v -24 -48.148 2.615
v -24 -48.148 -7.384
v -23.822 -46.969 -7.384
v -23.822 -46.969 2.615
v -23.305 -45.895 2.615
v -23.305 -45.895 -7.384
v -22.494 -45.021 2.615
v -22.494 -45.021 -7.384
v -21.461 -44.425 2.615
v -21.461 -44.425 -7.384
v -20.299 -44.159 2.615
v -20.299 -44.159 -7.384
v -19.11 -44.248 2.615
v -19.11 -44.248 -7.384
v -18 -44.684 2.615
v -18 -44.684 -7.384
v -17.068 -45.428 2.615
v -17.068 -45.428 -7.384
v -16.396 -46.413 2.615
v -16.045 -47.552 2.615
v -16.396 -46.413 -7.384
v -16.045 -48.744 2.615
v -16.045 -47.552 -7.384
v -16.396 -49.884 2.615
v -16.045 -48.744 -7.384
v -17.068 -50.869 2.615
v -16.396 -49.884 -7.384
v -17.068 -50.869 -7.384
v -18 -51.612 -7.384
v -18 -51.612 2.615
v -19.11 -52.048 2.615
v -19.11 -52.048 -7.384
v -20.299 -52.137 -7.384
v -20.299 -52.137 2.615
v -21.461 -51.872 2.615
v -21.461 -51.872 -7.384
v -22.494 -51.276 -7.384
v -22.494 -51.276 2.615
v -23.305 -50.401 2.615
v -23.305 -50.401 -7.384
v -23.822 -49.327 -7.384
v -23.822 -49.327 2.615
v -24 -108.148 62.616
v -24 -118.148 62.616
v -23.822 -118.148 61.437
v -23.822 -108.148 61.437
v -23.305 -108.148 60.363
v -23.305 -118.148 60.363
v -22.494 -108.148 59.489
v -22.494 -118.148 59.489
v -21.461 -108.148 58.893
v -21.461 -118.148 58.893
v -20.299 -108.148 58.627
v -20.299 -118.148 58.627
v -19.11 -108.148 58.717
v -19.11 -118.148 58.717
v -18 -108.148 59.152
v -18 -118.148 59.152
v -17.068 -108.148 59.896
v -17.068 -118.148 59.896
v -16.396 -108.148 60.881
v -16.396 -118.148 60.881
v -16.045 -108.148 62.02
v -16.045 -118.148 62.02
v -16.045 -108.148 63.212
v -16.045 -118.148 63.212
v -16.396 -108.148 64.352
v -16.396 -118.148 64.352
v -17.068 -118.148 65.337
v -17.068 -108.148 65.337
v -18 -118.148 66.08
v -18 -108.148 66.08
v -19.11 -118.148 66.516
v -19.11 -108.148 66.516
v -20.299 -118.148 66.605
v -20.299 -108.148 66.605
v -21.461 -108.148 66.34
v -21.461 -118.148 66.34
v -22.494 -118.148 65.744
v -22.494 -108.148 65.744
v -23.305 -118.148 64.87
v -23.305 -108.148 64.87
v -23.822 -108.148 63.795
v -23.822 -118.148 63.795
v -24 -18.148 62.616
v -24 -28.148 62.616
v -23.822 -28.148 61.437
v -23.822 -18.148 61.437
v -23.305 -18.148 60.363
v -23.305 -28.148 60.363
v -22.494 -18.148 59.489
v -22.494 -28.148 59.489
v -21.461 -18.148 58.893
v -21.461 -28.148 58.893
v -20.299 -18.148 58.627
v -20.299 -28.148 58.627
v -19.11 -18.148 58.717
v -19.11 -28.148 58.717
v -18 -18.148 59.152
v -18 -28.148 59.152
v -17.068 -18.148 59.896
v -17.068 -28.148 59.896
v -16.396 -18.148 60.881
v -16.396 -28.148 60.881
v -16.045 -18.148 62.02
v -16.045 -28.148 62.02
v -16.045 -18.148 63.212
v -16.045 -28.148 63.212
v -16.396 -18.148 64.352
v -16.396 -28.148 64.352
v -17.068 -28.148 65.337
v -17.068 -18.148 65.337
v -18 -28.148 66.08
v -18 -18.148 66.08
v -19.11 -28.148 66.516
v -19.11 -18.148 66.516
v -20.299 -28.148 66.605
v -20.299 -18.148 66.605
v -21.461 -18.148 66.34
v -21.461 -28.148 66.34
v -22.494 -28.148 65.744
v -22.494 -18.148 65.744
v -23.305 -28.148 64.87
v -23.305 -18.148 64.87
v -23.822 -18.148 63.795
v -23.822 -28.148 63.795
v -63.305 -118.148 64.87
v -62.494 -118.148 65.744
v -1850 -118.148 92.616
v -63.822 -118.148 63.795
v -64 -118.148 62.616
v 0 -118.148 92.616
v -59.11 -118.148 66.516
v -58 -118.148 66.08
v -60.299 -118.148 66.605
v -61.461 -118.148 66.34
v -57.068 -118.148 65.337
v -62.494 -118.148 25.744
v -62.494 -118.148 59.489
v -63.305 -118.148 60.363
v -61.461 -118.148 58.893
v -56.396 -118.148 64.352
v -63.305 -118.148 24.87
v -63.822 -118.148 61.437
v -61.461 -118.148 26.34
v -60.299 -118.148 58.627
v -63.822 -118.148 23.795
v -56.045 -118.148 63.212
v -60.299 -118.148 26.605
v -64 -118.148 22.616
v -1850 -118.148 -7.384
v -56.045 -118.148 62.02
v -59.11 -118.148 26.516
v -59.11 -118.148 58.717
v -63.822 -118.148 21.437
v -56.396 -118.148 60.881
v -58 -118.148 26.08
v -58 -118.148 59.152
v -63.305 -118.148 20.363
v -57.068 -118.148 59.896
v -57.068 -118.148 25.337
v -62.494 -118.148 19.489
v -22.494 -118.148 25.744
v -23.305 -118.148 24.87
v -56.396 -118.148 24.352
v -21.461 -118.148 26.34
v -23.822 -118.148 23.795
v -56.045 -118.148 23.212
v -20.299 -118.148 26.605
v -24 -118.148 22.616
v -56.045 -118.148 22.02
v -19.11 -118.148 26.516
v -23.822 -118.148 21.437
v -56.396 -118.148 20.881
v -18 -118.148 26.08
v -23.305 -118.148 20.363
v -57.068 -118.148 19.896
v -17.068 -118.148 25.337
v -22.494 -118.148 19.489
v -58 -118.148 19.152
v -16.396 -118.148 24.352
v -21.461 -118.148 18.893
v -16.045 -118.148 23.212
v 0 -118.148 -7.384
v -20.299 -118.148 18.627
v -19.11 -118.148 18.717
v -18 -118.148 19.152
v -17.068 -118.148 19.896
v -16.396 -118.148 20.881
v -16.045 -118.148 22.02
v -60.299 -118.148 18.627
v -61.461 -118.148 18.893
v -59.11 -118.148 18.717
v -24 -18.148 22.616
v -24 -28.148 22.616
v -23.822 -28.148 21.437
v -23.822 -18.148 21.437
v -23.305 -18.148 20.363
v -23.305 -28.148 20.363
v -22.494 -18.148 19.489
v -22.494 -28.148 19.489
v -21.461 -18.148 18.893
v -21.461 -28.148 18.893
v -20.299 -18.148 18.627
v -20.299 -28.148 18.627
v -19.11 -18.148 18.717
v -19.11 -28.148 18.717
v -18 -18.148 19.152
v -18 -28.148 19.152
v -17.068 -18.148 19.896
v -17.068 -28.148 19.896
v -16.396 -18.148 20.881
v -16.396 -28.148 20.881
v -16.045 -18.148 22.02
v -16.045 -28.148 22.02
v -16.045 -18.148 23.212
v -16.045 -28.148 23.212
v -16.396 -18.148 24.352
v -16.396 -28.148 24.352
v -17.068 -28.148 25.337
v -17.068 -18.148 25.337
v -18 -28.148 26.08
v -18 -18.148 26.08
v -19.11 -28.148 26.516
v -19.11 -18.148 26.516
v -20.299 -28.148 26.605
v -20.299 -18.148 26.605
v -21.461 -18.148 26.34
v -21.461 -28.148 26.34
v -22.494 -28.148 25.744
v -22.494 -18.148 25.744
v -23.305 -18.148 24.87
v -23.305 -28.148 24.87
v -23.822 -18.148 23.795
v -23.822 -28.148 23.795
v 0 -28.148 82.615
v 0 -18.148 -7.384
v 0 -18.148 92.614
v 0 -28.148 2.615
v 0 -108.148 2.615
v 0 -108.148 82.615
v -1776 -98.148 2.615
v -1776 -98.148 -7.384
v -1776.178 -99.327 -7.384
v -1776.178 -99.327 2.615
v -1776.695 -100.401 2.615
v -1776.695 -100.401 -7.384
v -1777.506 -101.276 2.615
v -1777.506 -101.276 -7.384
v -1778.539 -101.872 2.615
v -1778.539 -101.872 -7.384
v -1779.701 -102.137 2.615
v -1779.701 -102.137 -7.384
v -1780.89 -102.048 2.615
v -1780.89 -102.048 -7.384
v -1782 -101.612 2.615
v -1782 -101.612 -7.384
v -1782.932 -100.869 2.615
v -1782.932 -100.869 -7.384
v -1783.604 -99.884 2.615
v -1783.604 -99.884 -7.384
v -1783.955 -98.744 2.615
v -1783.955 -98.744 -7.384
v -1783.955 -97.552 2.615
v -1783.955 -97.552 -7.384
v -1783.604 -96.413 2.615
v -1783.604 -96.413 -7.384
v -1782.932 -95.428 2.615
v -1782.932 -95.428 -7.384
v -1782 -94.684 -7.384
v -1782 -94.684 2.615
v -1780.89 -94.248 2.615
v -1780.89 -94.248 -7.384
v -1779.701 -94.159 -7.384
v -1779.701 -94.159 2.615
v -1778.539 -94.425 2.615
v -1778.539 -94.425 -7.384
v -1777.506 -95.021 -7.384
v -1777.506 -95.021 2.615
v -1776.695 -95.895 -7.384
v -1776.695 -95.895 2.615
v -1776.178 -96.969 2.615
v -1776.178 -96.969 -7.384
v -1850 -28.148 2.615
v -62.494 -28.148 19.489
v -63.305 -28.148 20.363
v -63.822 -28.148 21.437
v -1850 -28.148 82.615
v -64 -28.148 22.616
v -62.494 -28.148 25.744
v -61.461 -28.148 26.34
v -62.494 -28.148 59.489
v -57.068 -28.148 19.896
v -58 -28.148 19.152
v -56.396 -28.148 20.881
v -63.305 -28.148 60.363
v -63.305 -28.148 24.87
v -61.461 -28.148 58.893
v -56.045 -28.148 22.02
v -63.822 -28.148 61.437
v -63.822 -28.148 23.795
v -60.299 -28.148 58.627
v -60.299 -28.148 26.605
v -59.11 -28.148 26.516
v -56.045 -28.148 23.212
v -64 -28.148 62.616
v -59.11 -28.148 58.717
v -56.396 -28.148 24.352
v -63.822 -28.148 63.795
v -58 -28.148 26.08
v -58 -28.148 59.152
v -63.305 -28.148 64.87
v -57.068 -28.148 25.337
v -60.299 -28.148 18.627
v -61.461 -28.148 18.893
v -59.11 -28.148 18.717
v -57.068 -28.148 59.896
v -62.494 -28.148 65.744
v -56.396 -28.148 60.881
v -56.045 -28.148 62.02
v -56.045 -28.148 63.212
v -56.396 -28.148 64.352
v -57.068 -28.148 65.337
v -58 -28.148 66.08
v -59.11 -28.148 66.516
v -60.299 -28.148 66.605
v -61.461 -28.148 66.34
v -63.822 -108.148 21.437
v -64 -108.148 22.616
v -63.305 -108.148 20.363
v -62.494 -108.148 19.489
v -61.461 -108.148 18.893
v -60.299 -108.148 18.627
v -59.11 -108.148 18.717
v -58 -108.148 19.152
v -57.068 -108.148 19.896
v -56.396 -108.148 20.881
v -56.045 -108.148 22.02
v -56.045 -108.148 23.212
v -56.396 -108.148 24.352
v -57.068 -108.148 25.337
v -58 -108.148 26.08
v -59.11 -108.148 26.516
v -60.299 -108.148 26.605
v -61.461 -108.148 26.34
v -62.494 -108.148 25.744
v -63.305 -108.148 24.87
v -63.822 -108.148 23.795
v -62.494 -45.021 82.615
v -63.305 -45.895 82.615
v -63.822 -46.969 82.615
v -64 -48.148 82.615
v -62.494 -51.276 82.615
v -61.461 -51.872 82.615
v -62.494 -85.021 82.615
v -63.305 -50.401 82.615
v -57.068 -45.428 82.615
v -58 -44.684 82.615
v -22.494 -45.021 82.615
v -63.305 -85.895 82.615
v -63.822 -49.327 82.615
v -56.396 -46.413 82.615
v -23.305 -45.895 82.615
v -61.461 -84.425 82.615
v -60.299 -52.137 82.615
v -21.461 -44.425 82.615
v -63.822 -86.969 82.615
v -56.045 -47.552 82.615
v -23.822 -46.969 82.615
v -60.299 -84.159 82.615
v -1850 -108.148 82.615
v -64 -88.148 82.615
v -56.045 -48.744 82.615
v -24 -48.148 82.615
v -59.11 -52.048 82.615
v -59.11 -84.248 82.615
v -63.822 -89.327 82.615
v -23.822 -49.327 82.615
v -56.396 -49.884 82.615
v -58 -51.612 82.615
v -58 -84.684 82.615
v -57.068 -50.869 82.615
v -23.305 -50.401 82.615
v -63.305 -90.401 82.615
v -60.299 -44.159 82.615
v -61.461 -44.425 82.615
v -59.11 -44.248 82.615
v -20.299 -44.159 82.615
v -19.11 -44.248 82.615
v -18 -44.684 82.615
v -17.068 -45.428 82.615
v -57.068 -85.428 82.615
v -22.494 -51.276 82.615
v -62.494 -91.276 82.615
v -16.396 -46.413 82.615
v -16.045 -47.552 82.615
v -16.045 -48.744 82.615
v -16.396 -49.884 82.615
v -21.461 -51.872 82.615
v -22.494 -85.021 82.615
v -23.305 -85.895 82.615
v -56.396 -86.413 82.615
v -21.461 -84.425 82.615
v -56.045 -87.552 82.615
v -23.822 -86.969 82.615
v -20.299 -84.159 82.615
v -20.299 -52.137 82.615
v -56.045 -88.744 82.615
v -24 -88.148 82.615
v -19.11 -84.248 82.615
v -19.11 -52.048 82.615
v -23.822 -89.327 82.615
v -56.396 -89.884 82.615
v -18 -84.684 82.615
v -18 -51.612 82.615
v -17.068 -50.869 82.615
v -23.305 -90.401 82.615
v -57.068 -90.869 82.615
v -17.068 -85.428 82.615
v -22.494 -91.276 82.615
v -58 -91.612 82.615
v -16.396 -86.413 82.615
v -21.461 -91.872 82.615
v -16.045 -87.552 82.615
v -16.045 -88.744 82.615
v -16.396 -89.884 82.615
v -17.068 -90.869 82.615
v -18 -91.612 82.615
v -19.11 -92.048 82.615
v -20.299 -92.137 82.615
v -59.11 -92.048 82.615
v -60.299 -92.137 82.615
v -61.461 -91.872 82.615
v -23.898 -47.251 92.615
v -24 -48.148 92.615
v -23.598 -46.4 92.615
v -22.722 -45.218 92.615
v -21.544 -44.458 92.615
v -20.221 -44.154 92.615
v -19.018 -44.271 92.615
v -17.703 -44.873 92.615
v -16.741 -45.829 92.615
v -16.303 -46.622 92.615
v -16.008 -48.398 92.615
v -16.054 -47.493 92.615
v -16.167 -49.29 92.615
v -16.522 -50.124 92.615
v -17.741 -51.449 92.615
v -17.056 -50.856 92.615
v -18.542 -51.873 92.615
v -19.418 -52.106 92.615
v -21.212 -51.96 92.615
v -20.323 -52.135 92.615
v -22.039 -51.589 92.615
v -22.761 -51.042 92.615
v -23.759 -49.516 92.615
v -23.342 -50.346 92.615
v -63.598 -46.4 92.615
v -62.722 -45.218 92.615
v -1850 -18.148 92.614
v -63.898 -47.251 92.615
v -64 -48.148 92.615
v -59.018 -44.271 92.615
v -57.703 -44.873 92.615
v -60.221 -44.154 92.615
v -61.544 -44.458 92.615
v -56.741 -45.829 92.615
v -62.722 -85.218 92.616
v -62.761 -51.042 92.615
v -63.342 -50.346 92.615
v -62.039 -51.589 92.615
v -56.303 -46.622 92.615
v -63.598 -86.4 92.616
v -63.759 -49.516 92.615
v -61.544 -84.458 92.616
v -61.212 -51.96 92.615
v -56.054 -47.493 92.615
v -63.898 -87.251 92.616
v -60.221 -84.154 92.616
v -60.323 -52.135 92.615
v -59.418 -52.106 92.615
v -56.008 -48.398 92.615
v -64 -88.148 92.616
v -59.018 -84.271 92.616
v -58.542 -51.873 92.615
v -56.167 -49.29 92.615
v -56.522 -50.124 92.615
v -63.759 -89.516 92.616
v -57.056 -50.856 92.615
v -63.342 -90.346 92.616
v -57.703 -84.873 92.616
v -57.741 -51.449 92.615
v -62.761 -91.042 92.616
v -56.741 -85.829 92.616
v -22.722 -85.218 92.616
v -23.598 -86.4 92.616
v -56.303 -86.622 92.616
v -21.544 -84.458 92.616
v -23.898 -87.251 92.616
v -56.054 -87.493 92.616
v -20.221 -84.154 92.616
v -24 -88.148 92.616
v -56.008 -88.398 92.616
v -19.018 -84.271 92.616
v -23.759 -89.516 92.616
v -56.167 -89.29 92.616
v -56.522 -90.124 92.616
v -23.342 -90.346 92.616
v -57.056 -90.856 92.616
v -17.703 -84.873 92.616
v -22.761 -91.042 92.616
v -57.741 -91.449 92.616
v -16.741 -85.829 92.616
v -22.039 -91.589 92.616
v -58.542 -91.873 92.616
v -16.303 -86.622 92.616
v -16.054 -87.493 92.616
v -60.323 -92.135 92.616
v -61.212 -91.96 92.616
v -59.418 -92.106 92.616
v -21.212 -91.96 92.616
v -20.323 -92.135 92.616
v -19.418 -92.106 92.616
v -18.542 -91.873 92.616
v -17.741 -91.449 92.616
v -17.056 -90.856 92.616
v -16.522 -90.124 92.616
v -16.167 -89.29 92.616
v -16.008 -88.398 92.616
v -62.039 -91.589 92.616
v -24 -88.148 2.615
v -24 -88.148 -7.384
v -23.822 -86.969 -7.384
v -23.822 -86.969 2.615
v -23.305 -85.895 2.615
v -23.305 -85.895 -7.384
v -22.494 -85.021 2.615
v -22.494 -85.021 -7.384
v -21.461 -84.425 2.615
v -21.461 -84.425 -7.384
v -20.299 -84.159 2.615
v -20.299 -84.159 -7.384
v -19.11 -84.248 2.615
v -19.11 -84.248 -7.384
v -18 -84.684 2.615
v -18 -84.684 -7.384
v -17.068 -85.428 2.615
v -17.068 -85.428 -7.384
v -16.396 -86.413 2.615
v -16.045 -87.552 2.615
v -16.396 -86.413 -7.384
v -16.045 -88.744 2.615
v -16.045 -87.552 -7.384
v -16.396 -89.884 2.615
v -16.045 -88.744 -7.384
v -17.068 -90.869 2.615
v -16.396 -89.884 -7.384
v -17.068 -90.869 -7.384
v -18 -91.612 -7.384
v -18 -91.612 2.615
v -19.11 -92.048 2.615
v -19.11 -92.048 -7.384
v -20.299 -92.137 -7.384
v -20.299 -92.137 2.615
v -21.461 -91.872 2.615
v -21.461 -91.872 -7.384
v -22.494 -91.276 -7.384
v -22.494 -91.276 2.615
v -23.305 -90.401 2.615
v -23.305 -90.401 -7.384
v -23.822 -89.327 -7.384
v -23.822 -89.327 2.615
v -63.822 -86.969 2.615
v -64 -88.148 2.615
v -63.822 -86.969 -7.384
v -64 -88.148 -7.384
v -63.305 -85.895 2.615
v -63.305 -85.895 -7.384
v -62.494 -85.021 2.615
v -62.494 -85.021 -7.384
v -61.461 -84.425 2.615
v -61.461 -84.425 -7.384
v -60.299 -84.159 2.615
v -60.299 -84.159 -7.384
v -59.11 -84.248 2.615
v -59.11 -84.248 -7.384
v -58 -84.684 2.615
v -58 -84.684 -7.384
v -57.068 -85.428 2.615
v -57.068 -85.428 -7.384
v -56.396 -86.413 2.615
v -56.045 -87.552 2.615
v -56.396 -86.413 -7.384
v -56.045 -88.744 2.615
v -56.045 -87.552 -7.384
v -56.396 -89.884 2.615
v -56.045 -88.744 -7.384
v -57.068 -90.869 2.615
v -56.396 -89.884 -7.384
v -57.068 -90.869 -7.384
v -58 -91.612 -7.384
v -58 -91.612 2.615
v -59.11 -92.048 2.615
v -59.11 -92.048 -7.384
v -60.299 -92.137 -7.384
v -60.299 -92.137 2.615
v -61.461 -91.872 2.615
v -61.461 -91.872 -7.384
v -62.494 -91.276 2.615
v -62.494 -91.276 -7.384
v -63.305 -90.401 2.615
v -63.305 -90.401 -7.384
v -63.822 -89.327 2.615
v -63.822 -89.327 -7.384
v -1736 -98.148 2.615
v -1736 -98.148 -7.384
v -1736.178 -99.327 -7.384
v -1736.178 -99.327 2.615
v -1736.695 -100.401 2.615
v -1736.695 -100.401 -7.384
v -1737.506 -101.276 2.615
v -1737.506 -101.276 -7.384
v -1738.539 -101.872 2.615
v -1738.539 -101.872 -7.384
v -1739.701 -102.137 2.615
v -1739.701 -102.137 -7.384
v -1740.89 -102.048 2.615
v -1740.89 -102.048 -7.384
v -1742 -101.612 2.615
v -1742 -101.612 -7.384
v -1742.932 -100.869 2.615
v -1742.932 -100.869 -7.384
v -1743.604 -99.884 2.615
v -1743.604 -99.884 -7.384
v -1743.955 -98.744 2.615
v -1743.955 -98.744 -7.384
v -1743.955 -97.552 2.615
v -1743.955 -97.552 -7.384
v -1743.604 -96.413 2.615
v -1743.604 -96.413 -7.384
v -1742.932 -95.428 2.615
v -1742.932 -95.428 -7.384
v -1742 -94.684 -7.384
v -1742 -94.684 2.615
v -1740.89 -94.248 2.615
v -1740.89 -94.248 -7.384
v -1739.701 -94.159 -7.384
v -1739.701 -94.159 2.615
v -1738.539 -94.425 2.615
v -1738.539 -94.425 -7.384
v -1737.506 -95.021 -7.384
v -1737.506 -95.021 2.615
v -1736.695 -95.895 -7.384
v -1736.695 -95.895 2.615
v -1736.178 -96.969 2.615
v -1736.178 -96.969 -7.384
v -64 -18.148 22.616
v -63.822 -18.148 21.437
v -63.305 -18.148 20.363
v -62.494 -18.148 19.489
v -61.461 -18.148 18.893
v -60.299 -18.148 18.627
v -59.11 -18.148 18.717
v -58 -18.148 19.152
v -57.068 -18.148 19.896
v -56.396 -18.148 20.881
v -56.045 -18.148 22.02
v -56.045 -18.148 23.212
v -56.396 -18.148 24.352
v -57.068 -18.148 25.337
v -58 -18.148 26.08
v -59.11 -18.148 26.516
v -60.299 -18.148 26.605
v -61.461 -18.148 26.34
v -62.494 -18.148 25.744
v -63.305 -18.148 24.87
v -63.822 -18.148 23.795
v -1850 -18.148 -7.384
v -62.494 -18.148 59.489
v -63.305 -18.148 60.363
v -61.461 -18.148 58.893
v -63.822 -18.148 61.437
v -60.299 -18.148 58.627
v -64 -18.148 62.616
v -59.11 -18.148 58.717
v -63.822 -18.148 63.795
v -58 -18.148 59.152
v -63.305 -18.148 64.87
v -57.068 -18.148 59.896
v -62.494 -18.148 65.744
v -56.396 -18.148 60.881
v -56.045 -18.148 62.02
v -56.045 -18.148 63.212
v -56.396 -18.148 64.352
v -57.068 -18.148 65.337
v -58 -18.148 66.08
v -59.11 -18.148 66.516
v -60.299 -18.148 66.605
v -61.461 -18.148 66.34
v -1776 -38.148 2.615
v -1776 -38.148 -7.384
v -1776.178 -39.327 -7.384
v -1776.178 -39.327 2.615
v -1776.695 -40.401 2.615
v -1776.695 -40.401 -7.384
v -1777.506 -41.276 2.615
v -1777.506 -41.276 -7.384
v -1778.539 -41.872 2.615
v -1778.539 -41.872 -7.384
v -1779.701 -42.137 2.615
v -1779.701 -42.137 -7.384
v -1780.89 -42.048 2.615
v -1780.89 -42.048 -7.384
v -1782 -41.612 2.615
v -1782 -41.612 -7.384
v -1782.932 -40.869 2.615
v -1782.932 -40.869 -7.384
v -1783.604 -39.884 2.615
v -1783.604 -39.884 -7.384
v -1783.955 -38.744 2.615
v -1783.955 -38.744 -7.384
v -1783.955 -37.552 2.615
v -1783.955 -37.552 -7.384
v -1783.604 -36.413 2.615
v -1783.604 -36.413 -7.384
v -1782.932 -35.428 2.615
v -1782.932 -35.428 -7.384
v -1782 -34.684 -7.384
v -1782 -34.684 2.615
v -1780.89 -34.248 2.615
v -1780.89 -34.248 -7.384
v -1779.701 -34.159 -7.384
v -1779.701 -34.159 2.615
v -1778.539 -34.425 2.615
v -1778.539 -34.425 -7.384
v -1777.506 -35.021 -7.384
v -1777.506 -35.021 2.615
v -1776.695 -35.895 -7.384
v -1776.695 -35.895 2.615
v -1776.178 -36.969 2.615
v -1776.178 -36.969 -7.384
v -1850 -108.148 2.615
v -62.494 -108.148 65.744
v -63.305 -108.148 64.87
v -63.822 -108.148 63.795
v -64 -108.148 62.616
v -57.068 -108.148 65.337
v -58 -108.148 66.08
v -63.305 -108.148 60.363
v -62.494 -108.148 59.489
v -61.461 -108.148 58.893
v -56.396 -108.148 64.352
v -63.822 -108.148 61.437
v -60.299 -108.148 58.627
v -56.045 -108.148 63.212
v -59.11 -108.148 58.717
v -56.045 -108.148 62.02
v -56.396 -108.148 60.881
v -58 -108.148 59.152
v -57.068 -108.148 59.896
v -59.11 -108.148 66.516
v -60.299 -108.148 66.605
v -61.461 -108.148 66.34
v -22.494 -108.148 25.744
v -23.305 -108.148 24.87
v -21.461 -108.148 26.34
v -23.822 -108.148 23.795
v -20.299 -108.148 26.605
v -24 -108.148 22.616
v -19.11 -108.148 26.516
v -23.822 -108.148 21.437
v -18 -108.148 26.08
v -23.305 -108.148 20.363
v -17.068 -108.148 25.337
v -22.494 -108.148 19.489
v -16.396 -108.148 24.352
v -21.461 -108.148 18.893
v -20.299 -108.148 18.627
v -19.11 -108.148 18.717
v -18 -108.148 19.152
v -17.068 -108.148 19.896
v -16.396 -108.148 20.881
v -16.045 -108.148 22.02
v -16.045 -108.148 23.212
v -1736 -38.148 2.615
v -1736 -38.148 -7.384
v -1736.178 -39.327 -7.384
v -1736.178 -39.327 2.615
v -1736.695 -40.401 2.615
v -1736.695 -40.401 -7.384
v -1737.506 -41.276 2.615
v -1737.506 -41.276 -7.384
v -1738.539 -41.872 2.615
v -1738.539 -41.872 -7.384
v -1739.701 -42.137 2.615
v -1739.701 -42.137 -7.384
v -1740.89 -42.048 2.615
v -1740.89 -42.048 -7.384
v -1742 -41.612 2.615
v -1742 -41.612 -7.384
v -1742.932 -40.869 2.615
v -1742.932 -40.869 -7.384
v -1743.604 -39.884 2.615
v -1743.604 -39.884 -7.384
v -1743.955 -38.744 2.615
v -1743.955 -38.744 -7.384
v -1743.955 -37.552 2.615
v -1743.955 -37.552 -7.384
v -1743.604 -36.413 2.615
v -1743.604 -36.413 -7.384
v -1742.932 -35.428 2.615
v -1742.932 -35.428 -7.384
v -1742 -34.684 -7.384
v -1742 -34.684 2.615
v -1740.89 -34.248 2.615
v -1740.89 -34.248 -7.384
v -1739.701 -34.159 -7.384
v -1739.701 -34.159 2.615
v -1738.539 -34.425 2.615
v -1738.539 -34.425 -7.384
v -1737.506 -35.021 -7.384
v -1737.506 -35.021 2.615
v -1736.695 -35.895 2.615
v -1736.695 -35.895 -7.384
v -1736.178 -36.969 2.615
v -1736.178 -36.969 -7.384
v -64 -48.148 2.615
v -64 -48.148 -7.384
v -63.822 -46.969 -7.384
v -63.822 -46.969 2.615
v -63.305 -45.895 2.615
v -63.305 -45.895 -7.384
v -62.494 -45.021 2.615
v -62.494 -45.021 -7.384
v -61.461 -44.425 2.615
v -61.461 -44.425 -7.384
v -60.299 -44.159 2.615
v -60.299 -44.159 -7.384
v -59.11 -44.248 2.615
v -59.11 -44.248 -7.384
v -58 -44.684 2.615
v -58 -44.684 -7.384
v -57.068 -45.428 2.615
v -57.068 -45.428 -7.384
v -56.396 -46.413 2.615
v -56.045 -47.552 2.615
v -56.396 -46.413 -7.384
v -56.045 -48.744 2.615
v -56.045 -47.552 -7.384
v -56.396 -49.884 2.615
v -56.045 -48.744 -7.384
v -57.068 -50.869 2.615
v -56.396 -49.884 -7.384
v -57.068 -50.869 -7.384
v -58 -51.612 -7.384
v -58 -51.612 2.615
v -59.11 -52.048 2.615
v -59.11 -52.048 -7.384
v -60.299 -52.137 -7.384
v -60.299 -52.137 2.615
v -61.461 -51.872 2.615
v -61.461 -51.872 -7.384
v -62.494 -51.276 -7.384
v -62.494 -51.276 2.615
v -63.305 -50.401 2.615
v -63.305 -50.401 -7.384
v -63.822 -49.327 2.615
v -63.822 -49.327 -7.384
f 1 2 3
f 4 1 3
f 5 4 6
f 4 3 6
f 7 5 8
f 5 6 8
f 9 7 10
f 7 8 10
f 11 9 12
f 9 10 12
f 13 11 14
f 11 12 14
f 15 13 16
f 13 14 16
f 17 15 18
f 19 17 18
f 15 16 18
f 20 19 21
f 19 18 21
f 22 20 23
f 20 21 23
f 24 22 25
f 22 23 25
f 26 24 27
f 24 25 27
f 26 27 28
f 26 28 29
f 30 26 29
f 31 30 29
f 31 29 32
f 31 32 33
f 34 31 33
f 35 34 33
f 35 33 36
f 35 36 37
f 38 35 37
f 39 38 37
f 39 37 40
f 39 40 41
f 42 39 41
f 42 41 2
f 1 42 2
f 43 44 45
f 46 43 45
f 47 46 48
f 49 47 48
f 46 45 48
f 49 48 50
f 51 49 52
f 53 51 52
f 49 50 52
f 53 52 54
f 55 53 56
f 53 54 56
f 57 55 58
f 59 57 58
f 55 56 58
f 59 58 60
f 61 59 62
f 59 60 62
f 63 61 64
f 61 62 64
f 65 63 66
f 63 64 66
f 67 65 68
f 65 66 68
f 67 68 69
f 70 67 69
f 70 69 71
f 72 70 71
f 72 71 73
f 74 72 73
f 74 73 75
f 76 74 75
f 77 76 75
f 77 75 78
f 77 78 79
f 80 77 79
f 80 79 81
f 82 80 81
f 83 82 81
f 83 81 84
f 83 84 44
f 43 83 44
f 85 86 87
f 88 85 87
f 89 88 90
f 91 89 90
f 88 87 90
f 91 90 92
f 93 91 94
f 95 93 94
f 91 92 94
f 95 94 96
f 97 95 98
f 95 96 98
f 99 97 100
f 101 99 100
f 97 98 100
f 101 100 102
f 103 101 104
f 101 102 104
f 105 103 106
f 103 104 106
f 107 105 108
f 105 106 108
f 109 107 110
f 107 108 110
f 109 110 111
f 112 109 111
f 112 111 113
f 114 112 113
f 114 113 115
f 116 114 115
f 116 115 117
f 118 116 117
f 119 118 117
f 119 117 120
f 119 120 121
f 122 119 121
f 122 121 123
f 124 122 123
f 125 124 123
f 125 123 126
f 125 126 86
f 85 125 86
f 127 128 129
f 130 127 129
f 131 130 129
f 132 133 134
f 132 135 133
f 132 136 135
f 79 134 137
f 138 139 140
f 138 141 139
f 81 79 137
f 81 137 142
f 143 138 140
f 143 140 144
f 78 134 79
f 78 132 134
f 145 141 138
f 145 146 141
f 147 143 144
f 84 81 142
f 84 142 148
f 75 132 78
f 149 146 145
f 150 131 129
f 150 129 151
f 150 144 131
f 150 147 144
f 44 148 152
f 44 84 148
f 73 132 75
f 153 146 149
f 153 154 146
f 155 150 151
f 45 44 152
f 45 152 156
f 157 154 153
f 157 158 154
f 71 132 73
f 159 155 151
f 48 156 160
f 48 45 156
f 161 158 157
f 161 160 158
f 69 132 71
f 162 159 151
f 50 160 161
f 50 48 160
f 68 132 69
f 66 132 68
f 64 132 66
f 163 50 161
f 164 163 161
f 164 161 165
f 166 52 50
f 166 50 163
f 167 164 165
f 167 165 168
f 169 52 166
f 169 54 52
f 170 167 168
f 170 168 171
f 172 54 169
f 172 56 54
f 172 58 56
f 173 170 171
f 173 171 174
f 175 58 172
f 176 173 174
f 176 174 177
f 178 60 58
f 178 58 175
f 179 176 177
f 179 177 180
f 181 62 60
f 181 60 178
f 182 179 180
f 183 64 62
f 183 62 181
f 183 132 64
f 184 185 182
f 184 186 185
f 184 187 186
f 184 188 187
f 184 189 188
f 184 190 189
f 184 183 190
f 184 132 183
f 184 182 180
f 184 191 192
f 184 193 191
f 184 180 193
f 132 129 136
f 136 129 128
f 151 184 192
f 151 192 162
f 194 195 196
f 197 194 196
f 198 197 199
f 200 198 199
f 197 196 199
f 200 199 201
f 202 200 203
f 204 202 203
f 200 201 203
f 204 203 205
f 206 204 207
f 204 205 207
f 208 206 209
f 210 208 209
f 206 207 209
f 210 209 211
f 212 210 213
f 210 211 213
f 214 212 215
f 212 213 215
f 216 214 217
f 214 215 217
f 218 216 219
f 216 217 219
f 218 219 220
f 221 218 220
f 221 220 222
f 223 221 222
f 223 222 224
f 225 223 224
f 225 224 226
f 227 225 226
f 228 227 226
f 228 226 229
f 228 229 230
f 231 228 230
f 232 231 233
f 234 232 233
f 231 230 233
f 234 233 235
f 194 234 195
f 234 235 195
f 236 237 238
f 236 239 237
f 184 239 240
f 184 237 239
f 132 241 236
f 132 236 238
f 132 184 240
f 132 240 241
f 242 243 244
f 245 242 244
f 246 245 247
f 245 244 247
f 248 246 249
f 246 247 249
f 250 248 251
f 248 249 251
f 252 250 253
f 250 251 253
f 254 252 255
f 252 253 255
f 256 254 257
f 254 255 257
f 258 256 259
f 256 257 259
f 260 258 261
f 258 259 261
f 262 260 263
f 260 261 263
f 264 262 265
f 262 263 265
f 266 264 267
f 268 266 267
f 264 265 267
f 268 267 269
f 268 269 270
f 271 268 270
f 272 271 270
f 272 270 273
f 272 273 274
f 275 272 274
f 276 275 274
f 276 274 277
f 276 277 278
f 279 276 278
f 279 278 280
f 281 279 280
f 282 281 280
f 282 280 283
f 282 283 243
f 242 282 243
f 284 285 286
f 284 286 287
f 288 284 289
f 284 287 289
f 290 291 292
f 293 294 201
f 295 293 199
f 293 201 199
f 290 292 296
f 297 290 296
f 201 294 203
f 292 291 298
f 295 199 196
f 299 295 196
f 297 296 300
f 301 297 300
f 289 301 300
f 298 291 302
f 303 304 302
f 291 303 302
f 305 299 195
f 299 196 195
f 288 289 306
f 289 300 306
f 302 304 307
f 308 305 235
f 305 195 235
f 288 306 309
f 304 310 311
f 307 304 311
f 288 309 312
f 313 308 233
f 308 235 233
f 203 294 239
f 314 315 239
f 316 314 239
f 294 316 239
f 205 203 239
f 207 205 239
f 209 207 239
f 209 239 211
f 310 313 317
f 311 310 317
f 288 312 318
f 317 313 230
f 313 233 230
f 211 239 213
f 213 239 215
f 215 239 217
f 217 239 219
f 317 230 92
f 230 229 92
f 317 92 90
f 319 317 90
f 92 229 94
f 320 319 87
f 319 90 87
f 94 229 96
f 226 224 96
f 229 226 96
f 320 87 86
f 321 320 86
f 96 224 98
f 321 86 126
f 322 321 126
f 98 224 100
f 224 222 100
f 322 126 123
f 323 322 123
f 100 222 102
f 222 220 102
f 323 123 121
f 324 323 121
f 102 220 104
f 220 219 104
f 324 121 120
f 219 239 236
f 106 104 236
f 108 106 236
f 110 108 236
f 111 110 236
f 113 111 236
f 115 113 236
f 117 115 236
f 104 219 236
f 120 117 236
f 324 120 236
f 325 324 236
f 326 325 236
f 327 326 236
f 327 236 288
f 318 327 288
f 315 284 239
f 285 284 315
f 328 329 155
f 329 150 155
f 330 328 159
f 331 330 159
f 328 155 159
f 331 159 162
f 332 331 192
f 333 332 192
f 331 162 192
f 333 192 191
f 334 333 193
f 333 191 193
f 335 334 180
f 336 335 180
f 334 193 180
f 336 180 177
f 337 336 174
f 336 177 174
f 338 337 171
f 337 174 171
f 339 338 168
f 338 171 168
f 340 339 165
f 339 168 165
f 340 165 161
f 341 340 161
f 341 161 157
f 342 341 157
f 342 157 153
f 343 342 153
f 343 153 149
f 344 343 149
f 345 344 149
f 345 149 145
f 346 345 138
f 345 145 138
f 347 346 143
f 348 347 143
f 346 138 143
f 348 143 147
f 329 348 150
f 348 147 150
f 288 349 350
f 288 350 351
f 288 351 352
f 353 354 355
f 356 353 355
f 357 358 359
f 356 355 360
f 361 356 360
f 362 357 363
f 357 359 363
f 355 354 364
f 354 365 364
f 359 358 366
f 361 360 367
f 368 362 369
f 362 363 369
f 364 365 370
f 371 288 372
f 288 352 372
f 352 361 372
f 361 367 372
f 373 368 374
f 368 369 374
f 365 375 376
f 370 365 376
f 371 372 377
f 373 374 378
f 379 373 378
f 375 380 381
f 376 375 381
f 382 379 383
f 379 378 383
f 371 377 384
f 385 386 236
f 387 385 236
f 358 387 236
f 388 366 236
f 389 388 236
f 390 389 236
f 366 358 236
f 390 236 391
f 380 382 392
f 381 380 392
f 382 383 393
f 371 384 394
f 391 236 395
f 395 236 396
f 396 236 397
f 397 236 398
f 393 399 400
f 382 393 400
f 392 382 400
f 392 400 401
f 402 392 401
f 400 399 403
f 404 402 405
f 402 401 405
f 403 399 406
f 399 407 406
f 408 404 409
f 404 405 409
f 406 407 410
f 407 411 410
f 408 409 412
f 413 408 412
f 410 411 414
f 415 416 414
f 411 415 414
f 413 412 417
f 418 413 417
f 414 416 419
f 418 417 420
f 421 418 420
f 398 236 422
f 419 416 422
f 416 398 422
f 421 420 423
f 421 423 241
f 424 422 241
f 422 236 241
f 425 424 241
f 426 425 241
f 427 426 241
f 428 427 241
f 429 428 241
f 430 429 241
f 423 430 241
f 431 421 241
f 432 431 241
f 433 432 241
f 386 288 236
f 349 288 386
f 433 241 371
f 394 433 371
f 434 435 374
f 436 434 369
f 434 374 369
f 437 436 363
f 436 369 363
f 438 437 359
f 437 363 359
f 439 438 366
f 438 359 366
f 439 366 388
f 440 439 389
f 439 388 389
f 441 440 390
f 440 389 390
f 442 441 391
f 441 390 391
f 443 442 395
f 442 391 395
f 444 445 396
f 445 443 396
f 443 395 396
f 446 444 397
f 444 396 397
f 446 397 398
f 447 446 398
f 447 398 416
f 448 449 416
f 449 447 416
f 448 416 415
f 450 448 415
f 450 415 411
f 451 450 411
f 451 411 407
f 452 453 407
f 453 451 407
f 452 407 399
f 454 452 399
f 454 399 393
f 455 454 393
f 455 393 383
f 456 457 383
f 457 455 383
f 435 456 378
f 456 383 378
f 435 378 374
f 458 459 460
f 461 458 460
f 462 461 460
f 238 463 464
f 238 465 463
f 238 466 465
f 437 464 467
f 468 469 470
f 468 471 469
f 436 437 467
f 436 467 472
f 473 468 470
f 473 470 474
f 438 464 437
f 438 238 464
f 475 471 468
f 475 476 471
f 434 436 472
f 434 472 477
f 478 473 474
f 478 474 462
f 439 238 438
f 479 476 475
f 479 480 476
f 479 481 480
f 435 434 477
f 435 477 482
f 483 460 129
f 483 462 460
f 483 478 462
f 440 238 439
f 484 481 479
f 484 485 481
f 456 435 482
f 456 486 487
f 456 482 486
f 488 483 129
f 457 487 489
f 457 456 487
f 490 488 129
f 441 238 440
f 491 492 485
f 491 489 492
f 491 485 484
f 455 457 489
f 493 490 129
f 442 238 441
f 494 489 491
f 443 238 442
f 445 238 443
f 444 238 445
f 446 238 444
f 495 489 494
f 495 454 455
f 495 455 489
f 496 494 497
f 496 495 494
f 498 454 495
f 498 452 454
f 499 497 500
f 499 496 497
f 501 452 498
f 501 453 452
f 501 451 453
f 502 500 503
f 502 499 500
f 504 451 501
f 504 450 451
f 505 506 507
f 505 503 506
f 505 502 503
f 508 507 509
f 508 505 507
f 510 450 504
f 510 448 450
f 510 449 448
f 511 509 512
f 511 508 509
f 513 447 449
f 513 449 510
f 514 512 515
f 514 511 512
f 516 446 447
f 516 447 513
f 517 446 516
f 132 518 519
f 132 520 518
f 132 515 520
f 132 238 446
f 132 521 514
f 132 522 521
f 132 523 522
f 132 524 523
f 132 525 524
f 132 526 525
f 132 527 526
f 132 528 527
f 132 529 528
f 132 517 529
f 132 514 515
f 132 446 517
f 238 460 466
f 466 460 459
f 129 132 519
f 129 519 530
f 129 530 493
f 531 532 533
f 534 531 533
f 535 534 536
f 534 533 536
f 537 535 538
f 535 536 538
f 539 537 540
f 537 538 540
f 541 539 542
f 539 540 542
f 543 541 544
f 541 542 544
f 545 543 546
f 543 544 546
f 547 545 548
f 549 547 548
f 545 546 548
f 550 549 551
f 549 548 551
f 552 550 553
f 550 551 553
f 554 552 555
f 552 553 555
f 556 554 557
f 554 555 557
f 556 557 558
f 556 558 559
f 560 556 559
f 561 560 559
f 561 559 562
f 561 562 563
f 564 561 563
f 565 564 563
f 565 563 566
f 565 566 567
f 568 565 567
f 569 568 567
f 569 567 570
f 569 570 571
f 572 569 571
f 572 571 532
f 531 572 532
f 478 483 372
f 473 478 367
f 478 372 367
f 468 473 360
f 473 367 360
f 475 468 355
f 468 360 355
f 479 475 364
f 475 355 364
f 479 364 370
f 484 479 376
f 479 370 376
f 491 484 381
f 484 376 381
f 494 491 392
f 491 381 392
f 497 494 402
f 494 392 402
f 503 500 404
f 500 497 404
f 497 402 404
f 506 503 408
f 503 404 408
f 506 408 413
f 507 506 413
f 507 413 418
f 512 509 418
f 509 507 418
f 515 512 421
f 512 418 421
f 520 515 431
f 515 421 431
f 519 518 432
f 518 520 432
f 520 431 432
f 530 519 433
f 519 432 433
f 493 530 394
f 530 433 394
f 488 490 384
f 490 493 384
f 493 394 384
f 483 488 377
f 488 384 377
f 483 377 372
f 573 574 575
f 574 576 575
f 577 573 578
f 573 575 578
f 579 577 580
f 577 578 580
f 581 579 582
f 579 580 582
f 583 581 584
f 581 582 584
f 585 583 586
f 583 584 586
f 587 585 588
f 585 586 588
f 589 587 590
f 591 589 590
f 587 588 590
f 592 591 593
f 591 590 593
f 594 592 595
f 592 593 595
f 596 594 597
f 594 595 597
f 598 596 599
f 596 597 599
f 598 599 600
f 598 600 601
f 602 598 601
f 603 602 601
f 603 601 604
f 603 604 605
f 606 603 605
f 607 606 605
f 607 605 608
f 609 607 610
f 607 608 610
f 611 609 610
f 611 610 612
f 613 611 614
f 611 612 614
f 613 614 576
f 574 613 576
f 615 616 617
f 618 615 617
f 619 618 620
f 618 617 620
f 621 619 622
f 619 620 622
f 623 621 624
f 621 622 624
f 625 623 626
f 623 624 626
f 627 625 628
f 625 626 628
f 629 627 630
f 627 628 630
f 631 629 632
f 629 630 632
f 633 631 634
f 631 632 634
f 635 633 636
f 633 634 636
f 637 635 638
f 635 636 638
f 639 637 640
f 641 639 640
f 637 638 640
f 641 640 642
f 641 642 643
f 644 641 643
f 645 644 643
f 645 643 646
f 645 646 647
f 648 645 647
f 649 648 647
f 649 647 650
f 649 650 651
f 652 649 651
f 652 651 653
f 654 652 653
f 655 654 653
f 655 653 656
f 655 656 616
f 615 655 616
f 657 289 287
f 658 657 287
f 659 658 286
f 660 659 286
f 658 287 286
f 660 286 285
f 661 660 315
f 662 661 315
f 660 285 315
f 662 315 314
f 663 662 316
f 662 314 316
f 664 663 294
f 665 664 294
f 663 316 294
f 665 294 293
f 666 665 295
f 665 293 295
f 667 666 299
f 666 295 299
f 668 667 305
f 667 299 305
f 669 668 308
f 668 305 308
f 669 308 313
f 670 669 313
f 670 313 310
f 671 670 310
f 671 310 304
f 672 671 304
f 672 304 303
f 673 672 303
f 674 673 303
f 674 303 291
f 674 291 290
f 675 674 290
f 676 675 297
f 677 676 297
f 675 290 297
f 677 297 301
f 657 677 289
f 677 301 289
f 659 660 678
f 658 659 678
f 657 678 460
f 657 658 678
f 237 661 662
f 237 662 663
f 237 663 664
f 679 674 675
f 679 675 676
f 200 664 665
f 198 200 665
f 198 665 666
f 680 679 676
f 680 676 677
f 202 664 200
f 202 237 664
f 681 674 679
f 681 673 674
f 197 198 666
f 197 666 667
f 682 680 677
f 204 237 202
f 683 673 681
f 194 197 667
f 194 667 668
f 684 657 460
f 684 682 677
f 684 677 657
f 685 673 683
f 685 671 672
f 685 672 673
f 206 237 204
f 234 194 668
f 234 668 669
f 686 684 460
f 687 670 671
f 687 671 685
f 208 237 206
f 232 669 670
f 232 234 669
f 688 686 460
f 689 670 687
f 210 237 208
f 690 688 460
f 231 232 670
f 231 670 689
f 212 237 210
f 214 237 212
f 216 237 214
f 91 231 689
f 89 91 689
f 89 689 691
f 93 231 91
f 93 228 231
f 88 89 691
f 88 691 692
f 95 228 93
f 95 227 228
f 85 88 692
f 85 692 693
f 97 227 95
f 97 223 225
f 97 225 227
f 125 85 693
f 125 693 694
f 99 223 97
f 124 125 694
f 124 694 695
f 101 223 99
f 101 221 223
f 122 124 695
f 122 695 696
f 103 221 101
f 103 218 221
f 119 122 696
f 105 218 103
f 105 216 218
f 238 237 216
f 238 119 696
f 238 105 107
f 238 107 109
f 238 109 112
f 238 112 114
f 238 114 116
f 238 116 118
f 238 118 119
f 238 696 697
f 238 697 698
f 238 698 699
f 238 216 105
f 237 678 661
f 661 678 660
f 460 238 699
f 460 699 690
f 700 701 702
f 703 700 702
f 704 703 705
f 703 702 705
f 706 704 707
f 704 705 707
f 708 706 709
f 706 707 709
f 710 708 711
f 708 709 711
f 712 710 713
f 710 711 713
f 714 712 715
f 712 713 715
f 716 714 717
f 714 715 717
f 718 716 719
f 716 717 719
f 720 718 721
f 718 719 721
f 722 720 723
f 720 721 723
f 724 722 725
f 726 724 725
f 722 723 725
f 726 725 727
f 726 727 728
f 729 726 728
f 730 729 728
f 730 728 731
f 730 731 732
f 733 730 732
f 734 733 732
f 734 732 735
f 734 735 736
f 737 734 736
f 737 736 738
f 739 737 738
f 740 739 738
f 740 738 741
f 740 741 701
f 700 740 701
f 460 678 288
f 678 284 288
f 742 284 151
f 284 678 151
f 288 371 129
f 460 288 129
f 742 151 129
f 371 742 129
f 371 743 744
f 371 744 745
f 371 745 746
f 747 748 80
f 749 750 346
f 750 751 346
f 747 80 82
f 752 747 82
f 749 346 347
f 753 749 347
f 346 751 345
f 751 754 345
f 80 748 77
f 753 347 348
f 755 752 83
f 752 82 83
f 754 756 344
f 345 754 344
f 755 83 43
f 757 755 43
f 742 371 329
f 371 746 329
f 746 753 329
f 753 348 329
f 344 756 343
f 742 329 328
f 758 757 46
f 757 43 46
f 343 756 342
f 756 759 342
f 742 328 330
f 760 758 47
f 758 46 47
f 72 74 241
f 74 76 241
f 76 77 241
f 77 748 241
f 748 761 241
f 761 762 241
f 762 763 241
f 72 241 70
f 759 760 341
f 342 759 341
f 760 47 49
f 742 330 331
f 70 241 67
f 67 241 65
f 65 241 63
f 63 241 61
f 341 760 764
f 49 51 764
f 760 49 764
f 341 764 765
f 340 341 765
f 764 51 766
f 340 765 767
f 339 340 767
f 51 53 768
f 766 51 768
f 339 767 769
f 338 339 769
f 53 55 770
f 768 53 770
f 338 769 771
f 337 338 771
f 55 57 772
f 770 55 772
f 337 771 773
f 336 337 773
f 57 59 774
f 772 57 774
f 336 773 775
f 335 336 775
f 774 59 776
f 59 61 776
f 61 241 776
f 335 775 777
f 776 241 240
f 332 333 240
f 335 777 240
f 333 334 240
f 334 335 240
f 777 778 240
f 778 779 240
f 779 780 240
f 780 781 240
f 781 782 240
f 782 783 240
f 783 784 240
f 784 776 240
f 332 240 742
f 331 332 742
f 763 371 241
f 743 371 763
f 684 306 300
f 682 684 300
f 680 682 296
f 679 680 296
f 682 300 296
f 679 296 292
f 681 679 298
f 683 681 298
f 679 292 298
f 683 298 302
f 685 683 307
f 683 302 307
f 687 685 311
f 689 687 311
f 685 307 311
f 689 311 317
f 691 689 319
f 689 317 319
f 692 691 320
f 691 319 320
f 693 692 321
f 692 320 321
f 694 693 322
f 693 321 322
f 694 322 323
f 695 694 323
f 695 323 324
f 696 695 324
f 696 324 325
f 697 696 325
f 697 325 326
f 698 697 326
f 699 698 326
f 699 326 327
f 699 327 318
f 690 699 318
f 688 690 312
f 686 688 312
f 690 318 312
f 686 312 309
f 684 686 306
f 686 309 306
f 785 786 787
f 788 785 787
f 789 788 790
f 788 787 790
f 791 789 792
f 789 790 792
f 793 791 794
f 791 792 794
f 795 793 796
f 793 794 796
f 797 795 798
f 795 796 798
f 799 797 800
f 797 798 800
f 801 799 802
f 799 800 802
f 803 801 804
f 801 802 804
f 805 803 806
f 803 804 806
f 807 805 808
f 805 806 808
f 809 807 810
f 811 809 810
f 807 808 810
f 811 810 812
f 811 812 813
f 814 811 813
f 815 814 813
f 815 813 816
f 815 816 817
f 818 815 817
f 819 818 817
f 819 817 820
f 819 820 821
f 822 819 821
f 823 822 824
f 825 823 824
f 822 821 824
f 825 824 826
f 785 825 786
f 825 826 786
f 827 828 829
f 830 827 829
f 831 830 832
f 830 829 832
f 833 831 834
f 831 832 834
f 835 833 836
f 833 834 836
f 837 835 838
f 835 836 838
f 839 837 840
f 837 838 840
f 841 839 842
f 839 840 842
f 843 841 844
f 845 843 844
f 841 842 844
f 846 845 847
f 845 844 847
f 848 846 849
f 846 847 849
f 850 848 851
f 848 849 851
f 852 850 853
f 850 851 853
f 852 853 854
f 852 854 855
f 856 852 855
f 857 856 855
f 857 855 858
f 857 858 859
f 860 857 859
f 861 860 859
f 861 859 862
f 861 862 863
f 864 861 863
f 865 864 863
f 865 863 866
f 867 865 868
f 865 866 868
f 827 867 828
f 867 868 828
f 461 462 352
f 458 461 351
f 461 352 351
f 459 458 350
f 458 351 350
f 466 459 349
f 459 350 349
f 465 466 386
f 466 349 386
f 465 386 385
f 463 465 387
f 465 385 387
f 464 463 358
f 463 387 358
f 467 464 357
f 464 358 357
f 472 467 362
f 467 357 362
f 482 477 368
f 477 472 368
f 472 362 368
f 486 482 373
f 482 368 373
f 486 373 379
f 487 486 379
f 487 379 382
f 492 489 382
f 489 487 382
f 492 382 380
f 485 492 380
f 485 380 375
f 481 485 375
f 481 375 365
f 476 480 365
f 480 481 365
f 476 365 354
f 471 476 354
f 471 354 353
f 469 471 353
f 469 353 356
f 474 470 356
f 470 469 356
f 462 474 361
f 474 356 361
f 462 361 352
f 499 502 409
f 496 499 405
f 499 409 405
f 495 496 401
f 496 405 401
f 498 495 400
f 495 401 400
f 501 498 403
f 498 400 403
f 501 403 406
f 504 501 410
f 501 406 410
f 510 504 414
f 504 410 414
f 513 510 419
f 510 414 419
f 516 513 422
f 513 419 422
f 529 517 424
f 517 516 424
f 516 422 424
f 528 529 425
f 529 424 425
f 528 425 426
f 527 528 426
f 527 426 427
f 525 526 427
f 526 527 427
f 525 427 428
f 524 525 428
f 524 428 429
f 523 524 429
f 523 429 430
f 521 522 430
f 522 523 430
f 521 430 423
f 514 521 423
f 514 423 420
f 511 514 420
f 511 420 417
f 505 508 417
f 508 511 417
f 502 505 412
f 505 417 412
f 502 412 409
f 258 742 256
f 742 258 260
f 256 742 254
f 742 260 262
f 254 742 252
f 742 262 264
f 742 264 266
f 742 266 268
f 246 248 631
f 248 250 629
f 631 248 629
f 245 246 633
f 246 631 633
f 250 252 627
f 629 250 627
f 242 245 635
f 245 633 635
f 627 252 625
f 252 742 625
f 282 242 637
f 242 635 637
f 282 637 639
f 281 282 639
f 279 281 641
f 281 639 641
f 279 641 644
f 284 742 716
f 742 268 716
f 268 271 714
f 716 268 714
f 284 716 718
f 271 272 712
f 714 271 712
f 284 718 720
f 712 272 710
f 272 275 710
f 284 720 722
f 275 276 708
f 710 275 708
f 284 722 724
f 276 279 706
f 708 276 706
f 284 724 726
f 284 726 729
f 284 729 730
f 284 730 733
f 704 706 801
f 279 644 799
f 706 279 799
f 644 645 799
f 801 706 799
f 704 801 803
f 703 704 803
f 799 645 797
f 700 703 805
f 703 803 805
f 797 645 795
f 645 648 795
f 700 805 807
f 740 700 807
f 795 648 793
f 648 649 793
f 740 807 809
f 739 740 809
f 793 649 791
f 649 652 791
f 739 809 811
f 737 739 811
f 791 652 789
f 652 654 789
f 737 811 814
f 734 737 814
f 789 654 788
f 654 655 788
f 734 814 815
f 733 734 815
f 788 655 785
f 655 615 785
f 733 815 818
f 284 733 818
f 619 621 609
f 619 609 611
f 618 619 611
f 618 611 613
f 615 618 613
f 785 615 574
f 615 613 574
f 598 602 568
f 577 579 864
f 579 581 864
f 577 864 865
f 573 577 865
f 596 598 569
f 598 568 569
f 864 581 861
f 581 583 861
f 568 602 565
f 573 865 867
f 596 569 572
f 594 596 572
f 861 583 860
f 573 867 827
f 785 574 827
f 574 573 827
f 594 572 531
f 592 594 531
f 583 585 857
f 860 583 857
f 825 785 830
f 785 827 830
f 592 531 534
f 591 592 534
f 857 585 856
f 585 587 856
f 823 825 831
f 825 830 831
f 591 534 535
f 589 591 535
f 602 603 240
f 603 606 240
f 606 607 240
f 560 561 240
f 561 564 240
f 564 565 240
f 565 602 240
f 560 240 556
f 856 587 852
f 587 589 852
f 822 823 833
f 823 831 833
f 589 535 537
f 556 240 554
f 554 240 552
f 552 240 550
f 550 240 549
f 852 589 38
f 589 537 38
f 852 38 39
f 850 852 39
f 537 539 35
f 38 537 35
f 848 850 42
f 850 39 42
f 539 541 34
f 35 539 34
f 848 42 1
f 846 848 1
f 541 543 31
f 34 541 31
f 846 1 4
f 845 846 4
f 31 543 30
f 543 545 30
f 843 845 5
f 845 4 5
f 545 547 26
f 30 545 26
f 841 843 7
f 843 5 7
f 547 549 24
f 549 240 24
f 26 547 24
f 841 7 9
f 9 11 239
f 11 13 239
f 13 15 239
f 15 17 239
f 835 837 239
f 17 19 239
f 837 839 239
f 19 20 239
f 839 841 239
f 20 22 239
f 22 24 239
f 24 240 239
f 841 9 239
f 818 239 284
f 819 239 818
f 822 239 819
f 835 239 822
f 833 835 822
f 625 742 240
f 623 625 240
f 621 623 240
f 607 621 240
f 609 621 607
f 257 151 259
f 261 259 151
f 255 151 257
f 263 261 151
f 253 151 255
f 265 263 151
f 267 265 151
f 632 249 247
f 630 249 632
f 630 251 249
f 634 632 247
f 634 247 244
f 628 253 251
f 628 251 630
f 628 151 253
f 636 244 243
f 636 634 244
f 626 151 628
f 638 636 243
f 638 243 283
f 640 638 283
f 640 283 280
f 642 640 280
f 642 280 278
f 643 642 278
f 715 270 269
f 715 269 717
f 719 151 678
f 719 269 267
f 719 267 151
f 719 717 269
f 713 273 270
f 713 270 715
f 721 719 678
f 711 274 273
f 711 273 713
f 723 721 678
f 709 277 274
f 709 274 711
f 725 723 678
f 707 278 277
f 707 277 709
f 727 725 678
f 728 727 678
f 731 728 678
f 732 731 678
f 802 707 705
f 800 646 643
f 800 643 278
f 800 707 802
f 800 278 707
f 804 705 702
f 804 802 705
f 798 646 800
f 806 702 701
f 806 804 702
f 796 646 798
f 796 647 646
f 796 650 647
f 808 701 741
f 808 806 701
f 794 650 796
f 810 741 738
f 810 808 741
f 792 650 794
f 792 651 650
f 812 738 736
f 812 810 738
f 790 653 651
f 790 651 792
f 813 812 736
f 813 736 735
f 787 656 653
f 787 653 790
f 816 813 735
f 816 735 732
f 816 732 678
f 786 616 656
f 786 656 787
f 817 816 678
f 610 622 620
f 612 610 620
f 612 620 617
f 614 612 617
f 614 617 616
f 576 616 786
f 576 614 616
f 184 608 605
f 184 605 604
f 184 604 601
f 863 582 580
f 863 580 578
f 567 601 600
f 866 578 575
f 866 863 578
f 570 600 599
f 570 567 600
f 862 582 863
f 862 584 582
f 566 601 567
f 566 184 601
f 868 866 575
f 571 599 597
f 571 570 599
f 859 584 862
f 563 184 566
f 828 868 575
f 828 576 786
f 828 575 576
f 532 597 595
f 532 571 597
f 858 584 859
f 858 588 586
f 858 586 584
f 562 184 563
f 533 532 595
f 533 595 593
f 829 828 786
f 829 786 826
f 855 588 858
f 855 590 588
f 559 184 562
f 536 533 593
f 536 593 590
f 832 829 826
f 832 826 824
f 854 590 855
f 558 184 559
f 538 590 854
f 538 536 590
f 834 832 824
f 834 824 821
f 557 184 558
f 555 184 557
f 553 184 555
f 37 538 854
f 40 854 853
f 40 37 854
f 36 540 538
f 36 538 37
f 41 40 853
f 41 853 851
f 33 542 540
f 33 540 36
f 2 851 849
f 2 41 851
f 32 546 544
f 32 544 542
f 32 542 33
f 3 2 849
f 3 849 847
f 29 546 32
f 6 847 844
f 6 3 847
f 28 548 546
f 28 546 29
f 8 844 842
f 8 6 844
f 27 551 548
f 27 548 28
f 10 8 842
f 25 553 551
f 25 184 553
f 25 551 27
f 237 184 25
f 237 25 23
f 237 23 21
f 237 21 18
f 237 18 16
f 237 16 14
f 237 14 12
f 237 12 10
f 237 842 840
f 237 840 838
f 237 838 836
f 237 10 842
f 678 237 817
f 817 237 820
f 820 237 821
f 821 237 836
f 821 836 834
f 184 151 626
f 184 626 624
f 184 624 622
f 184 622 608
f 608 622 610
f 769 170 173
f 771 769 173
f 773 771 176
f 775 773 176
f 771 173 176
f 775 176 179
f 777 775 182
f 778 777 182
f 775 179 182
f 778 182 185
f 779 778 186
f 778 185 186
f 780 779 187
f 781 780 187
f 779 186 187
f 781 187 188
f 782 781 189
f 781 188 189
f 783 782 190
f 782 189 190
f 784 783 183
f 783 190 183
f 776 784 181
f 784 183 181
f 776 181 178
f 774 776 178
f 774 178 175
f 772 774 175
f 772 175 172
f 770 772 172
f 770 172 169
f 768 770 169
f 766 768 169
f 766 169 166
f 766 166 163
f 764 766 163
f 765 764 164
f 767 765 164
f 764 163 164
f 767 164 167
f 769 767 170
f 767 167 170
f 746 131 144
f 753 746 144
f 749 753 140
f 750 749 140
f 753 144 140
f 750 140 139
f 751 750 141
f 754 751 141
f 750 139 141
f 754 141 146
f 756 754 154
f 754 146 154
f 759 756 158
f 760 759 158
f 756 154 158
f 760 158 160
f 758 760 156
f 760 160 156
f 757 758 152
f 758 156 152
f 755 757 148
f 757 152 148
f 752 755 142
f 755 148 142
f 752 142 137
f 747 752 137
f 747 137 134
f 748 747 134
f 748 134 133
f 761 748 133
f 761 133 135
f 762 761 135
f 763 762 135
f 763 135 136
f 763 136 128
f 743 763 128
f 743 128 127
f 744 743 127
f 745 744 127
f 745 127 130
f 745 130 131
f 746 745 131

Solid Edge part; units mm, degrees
sketch "Sketch1" plane through (0, 0, 0) normal (1, 0, 0) x (0, 1, 0)
  line L0 (-108.1482, 2.6153) -> (-28.1482, 2.6153)
  line L1 (-28.1482, 2.6153) -> (-28.1482, 82.6153)
  line L2 (-28.1482, 82.6153) -> (-108.1482, 82.6153)
  line L3 (-108.1482, 82.6153) -> (-108.1482, 2.6153)
  line L4 (-118.1482, -7.3837) -> (-18.1482, -7.3837)
  line L5 (-18.1482, -7.3837) -> (-18.1482, 92.6144)
  line L6 (-18.1482, 92.6144) -> (-118.1482, 92.6163)
  line L7 (-118.1482, 92.6163) -> (-118.1482, -7.3837)
  dimension "D1" = 100
  dimension "D2" = 100
  dimension "D3" = 80
  dimension "D4" = 80
extrude "Protrusion1" add sketch "Sketch1" against normal blind 1850
sketch "Sketch2" plane through (-925, -118.1482, 42.6163) normal (0, -1, 0) x (-1, 0, 0)
  circle A0 centre (-905, -20) radius 4
  circle A1 centre (-865, 20) radius 4
  circle A2 centre (-865, -20) radius 4
  circle A3 centre (-905, 20) radius 4
  dimension "D1" = 8
  dimension "D2" = 8
  dimension "D3" = 8
  dimension "D4" = 8
  dimension "D5" = 20
  dimension "D6" = 40
  dimension "D7" = 20
  dimension "D8" = 20
extrude "Cutout1" cut sketch "Sketch2" against normal through all
mirror "Mirror1" about plane through (-925, -153.5035, -42.739) normal (0, 0.7071, -0.7071) of "Cutout1"
sketch "Sketch3" plane through (-925, -68.1482, -7.3837) normal (0, 0, -1) x (1, 0, 0)
  circle A0 centre (-855, -30) radius 4
  circle A1 centre (-815, 30) radius 4
  circle A2 centre (-815, -30) radius 4
  circle A3 centre (-855, 30) radius 4
  dimension "D1" = 8
  dimension "D2" = 8
  dimension "D3" = 8
  dimension "D4" = 8
  dimension "D5" = 60
  dimension "D6" = 30
  dimension "D7" = 70
  dimension "D8" = 40
extrude "Cutout3" cut sketch "Sketch3" against normal blind 46.6265
properties material "Aluminum, 6061-T6"
